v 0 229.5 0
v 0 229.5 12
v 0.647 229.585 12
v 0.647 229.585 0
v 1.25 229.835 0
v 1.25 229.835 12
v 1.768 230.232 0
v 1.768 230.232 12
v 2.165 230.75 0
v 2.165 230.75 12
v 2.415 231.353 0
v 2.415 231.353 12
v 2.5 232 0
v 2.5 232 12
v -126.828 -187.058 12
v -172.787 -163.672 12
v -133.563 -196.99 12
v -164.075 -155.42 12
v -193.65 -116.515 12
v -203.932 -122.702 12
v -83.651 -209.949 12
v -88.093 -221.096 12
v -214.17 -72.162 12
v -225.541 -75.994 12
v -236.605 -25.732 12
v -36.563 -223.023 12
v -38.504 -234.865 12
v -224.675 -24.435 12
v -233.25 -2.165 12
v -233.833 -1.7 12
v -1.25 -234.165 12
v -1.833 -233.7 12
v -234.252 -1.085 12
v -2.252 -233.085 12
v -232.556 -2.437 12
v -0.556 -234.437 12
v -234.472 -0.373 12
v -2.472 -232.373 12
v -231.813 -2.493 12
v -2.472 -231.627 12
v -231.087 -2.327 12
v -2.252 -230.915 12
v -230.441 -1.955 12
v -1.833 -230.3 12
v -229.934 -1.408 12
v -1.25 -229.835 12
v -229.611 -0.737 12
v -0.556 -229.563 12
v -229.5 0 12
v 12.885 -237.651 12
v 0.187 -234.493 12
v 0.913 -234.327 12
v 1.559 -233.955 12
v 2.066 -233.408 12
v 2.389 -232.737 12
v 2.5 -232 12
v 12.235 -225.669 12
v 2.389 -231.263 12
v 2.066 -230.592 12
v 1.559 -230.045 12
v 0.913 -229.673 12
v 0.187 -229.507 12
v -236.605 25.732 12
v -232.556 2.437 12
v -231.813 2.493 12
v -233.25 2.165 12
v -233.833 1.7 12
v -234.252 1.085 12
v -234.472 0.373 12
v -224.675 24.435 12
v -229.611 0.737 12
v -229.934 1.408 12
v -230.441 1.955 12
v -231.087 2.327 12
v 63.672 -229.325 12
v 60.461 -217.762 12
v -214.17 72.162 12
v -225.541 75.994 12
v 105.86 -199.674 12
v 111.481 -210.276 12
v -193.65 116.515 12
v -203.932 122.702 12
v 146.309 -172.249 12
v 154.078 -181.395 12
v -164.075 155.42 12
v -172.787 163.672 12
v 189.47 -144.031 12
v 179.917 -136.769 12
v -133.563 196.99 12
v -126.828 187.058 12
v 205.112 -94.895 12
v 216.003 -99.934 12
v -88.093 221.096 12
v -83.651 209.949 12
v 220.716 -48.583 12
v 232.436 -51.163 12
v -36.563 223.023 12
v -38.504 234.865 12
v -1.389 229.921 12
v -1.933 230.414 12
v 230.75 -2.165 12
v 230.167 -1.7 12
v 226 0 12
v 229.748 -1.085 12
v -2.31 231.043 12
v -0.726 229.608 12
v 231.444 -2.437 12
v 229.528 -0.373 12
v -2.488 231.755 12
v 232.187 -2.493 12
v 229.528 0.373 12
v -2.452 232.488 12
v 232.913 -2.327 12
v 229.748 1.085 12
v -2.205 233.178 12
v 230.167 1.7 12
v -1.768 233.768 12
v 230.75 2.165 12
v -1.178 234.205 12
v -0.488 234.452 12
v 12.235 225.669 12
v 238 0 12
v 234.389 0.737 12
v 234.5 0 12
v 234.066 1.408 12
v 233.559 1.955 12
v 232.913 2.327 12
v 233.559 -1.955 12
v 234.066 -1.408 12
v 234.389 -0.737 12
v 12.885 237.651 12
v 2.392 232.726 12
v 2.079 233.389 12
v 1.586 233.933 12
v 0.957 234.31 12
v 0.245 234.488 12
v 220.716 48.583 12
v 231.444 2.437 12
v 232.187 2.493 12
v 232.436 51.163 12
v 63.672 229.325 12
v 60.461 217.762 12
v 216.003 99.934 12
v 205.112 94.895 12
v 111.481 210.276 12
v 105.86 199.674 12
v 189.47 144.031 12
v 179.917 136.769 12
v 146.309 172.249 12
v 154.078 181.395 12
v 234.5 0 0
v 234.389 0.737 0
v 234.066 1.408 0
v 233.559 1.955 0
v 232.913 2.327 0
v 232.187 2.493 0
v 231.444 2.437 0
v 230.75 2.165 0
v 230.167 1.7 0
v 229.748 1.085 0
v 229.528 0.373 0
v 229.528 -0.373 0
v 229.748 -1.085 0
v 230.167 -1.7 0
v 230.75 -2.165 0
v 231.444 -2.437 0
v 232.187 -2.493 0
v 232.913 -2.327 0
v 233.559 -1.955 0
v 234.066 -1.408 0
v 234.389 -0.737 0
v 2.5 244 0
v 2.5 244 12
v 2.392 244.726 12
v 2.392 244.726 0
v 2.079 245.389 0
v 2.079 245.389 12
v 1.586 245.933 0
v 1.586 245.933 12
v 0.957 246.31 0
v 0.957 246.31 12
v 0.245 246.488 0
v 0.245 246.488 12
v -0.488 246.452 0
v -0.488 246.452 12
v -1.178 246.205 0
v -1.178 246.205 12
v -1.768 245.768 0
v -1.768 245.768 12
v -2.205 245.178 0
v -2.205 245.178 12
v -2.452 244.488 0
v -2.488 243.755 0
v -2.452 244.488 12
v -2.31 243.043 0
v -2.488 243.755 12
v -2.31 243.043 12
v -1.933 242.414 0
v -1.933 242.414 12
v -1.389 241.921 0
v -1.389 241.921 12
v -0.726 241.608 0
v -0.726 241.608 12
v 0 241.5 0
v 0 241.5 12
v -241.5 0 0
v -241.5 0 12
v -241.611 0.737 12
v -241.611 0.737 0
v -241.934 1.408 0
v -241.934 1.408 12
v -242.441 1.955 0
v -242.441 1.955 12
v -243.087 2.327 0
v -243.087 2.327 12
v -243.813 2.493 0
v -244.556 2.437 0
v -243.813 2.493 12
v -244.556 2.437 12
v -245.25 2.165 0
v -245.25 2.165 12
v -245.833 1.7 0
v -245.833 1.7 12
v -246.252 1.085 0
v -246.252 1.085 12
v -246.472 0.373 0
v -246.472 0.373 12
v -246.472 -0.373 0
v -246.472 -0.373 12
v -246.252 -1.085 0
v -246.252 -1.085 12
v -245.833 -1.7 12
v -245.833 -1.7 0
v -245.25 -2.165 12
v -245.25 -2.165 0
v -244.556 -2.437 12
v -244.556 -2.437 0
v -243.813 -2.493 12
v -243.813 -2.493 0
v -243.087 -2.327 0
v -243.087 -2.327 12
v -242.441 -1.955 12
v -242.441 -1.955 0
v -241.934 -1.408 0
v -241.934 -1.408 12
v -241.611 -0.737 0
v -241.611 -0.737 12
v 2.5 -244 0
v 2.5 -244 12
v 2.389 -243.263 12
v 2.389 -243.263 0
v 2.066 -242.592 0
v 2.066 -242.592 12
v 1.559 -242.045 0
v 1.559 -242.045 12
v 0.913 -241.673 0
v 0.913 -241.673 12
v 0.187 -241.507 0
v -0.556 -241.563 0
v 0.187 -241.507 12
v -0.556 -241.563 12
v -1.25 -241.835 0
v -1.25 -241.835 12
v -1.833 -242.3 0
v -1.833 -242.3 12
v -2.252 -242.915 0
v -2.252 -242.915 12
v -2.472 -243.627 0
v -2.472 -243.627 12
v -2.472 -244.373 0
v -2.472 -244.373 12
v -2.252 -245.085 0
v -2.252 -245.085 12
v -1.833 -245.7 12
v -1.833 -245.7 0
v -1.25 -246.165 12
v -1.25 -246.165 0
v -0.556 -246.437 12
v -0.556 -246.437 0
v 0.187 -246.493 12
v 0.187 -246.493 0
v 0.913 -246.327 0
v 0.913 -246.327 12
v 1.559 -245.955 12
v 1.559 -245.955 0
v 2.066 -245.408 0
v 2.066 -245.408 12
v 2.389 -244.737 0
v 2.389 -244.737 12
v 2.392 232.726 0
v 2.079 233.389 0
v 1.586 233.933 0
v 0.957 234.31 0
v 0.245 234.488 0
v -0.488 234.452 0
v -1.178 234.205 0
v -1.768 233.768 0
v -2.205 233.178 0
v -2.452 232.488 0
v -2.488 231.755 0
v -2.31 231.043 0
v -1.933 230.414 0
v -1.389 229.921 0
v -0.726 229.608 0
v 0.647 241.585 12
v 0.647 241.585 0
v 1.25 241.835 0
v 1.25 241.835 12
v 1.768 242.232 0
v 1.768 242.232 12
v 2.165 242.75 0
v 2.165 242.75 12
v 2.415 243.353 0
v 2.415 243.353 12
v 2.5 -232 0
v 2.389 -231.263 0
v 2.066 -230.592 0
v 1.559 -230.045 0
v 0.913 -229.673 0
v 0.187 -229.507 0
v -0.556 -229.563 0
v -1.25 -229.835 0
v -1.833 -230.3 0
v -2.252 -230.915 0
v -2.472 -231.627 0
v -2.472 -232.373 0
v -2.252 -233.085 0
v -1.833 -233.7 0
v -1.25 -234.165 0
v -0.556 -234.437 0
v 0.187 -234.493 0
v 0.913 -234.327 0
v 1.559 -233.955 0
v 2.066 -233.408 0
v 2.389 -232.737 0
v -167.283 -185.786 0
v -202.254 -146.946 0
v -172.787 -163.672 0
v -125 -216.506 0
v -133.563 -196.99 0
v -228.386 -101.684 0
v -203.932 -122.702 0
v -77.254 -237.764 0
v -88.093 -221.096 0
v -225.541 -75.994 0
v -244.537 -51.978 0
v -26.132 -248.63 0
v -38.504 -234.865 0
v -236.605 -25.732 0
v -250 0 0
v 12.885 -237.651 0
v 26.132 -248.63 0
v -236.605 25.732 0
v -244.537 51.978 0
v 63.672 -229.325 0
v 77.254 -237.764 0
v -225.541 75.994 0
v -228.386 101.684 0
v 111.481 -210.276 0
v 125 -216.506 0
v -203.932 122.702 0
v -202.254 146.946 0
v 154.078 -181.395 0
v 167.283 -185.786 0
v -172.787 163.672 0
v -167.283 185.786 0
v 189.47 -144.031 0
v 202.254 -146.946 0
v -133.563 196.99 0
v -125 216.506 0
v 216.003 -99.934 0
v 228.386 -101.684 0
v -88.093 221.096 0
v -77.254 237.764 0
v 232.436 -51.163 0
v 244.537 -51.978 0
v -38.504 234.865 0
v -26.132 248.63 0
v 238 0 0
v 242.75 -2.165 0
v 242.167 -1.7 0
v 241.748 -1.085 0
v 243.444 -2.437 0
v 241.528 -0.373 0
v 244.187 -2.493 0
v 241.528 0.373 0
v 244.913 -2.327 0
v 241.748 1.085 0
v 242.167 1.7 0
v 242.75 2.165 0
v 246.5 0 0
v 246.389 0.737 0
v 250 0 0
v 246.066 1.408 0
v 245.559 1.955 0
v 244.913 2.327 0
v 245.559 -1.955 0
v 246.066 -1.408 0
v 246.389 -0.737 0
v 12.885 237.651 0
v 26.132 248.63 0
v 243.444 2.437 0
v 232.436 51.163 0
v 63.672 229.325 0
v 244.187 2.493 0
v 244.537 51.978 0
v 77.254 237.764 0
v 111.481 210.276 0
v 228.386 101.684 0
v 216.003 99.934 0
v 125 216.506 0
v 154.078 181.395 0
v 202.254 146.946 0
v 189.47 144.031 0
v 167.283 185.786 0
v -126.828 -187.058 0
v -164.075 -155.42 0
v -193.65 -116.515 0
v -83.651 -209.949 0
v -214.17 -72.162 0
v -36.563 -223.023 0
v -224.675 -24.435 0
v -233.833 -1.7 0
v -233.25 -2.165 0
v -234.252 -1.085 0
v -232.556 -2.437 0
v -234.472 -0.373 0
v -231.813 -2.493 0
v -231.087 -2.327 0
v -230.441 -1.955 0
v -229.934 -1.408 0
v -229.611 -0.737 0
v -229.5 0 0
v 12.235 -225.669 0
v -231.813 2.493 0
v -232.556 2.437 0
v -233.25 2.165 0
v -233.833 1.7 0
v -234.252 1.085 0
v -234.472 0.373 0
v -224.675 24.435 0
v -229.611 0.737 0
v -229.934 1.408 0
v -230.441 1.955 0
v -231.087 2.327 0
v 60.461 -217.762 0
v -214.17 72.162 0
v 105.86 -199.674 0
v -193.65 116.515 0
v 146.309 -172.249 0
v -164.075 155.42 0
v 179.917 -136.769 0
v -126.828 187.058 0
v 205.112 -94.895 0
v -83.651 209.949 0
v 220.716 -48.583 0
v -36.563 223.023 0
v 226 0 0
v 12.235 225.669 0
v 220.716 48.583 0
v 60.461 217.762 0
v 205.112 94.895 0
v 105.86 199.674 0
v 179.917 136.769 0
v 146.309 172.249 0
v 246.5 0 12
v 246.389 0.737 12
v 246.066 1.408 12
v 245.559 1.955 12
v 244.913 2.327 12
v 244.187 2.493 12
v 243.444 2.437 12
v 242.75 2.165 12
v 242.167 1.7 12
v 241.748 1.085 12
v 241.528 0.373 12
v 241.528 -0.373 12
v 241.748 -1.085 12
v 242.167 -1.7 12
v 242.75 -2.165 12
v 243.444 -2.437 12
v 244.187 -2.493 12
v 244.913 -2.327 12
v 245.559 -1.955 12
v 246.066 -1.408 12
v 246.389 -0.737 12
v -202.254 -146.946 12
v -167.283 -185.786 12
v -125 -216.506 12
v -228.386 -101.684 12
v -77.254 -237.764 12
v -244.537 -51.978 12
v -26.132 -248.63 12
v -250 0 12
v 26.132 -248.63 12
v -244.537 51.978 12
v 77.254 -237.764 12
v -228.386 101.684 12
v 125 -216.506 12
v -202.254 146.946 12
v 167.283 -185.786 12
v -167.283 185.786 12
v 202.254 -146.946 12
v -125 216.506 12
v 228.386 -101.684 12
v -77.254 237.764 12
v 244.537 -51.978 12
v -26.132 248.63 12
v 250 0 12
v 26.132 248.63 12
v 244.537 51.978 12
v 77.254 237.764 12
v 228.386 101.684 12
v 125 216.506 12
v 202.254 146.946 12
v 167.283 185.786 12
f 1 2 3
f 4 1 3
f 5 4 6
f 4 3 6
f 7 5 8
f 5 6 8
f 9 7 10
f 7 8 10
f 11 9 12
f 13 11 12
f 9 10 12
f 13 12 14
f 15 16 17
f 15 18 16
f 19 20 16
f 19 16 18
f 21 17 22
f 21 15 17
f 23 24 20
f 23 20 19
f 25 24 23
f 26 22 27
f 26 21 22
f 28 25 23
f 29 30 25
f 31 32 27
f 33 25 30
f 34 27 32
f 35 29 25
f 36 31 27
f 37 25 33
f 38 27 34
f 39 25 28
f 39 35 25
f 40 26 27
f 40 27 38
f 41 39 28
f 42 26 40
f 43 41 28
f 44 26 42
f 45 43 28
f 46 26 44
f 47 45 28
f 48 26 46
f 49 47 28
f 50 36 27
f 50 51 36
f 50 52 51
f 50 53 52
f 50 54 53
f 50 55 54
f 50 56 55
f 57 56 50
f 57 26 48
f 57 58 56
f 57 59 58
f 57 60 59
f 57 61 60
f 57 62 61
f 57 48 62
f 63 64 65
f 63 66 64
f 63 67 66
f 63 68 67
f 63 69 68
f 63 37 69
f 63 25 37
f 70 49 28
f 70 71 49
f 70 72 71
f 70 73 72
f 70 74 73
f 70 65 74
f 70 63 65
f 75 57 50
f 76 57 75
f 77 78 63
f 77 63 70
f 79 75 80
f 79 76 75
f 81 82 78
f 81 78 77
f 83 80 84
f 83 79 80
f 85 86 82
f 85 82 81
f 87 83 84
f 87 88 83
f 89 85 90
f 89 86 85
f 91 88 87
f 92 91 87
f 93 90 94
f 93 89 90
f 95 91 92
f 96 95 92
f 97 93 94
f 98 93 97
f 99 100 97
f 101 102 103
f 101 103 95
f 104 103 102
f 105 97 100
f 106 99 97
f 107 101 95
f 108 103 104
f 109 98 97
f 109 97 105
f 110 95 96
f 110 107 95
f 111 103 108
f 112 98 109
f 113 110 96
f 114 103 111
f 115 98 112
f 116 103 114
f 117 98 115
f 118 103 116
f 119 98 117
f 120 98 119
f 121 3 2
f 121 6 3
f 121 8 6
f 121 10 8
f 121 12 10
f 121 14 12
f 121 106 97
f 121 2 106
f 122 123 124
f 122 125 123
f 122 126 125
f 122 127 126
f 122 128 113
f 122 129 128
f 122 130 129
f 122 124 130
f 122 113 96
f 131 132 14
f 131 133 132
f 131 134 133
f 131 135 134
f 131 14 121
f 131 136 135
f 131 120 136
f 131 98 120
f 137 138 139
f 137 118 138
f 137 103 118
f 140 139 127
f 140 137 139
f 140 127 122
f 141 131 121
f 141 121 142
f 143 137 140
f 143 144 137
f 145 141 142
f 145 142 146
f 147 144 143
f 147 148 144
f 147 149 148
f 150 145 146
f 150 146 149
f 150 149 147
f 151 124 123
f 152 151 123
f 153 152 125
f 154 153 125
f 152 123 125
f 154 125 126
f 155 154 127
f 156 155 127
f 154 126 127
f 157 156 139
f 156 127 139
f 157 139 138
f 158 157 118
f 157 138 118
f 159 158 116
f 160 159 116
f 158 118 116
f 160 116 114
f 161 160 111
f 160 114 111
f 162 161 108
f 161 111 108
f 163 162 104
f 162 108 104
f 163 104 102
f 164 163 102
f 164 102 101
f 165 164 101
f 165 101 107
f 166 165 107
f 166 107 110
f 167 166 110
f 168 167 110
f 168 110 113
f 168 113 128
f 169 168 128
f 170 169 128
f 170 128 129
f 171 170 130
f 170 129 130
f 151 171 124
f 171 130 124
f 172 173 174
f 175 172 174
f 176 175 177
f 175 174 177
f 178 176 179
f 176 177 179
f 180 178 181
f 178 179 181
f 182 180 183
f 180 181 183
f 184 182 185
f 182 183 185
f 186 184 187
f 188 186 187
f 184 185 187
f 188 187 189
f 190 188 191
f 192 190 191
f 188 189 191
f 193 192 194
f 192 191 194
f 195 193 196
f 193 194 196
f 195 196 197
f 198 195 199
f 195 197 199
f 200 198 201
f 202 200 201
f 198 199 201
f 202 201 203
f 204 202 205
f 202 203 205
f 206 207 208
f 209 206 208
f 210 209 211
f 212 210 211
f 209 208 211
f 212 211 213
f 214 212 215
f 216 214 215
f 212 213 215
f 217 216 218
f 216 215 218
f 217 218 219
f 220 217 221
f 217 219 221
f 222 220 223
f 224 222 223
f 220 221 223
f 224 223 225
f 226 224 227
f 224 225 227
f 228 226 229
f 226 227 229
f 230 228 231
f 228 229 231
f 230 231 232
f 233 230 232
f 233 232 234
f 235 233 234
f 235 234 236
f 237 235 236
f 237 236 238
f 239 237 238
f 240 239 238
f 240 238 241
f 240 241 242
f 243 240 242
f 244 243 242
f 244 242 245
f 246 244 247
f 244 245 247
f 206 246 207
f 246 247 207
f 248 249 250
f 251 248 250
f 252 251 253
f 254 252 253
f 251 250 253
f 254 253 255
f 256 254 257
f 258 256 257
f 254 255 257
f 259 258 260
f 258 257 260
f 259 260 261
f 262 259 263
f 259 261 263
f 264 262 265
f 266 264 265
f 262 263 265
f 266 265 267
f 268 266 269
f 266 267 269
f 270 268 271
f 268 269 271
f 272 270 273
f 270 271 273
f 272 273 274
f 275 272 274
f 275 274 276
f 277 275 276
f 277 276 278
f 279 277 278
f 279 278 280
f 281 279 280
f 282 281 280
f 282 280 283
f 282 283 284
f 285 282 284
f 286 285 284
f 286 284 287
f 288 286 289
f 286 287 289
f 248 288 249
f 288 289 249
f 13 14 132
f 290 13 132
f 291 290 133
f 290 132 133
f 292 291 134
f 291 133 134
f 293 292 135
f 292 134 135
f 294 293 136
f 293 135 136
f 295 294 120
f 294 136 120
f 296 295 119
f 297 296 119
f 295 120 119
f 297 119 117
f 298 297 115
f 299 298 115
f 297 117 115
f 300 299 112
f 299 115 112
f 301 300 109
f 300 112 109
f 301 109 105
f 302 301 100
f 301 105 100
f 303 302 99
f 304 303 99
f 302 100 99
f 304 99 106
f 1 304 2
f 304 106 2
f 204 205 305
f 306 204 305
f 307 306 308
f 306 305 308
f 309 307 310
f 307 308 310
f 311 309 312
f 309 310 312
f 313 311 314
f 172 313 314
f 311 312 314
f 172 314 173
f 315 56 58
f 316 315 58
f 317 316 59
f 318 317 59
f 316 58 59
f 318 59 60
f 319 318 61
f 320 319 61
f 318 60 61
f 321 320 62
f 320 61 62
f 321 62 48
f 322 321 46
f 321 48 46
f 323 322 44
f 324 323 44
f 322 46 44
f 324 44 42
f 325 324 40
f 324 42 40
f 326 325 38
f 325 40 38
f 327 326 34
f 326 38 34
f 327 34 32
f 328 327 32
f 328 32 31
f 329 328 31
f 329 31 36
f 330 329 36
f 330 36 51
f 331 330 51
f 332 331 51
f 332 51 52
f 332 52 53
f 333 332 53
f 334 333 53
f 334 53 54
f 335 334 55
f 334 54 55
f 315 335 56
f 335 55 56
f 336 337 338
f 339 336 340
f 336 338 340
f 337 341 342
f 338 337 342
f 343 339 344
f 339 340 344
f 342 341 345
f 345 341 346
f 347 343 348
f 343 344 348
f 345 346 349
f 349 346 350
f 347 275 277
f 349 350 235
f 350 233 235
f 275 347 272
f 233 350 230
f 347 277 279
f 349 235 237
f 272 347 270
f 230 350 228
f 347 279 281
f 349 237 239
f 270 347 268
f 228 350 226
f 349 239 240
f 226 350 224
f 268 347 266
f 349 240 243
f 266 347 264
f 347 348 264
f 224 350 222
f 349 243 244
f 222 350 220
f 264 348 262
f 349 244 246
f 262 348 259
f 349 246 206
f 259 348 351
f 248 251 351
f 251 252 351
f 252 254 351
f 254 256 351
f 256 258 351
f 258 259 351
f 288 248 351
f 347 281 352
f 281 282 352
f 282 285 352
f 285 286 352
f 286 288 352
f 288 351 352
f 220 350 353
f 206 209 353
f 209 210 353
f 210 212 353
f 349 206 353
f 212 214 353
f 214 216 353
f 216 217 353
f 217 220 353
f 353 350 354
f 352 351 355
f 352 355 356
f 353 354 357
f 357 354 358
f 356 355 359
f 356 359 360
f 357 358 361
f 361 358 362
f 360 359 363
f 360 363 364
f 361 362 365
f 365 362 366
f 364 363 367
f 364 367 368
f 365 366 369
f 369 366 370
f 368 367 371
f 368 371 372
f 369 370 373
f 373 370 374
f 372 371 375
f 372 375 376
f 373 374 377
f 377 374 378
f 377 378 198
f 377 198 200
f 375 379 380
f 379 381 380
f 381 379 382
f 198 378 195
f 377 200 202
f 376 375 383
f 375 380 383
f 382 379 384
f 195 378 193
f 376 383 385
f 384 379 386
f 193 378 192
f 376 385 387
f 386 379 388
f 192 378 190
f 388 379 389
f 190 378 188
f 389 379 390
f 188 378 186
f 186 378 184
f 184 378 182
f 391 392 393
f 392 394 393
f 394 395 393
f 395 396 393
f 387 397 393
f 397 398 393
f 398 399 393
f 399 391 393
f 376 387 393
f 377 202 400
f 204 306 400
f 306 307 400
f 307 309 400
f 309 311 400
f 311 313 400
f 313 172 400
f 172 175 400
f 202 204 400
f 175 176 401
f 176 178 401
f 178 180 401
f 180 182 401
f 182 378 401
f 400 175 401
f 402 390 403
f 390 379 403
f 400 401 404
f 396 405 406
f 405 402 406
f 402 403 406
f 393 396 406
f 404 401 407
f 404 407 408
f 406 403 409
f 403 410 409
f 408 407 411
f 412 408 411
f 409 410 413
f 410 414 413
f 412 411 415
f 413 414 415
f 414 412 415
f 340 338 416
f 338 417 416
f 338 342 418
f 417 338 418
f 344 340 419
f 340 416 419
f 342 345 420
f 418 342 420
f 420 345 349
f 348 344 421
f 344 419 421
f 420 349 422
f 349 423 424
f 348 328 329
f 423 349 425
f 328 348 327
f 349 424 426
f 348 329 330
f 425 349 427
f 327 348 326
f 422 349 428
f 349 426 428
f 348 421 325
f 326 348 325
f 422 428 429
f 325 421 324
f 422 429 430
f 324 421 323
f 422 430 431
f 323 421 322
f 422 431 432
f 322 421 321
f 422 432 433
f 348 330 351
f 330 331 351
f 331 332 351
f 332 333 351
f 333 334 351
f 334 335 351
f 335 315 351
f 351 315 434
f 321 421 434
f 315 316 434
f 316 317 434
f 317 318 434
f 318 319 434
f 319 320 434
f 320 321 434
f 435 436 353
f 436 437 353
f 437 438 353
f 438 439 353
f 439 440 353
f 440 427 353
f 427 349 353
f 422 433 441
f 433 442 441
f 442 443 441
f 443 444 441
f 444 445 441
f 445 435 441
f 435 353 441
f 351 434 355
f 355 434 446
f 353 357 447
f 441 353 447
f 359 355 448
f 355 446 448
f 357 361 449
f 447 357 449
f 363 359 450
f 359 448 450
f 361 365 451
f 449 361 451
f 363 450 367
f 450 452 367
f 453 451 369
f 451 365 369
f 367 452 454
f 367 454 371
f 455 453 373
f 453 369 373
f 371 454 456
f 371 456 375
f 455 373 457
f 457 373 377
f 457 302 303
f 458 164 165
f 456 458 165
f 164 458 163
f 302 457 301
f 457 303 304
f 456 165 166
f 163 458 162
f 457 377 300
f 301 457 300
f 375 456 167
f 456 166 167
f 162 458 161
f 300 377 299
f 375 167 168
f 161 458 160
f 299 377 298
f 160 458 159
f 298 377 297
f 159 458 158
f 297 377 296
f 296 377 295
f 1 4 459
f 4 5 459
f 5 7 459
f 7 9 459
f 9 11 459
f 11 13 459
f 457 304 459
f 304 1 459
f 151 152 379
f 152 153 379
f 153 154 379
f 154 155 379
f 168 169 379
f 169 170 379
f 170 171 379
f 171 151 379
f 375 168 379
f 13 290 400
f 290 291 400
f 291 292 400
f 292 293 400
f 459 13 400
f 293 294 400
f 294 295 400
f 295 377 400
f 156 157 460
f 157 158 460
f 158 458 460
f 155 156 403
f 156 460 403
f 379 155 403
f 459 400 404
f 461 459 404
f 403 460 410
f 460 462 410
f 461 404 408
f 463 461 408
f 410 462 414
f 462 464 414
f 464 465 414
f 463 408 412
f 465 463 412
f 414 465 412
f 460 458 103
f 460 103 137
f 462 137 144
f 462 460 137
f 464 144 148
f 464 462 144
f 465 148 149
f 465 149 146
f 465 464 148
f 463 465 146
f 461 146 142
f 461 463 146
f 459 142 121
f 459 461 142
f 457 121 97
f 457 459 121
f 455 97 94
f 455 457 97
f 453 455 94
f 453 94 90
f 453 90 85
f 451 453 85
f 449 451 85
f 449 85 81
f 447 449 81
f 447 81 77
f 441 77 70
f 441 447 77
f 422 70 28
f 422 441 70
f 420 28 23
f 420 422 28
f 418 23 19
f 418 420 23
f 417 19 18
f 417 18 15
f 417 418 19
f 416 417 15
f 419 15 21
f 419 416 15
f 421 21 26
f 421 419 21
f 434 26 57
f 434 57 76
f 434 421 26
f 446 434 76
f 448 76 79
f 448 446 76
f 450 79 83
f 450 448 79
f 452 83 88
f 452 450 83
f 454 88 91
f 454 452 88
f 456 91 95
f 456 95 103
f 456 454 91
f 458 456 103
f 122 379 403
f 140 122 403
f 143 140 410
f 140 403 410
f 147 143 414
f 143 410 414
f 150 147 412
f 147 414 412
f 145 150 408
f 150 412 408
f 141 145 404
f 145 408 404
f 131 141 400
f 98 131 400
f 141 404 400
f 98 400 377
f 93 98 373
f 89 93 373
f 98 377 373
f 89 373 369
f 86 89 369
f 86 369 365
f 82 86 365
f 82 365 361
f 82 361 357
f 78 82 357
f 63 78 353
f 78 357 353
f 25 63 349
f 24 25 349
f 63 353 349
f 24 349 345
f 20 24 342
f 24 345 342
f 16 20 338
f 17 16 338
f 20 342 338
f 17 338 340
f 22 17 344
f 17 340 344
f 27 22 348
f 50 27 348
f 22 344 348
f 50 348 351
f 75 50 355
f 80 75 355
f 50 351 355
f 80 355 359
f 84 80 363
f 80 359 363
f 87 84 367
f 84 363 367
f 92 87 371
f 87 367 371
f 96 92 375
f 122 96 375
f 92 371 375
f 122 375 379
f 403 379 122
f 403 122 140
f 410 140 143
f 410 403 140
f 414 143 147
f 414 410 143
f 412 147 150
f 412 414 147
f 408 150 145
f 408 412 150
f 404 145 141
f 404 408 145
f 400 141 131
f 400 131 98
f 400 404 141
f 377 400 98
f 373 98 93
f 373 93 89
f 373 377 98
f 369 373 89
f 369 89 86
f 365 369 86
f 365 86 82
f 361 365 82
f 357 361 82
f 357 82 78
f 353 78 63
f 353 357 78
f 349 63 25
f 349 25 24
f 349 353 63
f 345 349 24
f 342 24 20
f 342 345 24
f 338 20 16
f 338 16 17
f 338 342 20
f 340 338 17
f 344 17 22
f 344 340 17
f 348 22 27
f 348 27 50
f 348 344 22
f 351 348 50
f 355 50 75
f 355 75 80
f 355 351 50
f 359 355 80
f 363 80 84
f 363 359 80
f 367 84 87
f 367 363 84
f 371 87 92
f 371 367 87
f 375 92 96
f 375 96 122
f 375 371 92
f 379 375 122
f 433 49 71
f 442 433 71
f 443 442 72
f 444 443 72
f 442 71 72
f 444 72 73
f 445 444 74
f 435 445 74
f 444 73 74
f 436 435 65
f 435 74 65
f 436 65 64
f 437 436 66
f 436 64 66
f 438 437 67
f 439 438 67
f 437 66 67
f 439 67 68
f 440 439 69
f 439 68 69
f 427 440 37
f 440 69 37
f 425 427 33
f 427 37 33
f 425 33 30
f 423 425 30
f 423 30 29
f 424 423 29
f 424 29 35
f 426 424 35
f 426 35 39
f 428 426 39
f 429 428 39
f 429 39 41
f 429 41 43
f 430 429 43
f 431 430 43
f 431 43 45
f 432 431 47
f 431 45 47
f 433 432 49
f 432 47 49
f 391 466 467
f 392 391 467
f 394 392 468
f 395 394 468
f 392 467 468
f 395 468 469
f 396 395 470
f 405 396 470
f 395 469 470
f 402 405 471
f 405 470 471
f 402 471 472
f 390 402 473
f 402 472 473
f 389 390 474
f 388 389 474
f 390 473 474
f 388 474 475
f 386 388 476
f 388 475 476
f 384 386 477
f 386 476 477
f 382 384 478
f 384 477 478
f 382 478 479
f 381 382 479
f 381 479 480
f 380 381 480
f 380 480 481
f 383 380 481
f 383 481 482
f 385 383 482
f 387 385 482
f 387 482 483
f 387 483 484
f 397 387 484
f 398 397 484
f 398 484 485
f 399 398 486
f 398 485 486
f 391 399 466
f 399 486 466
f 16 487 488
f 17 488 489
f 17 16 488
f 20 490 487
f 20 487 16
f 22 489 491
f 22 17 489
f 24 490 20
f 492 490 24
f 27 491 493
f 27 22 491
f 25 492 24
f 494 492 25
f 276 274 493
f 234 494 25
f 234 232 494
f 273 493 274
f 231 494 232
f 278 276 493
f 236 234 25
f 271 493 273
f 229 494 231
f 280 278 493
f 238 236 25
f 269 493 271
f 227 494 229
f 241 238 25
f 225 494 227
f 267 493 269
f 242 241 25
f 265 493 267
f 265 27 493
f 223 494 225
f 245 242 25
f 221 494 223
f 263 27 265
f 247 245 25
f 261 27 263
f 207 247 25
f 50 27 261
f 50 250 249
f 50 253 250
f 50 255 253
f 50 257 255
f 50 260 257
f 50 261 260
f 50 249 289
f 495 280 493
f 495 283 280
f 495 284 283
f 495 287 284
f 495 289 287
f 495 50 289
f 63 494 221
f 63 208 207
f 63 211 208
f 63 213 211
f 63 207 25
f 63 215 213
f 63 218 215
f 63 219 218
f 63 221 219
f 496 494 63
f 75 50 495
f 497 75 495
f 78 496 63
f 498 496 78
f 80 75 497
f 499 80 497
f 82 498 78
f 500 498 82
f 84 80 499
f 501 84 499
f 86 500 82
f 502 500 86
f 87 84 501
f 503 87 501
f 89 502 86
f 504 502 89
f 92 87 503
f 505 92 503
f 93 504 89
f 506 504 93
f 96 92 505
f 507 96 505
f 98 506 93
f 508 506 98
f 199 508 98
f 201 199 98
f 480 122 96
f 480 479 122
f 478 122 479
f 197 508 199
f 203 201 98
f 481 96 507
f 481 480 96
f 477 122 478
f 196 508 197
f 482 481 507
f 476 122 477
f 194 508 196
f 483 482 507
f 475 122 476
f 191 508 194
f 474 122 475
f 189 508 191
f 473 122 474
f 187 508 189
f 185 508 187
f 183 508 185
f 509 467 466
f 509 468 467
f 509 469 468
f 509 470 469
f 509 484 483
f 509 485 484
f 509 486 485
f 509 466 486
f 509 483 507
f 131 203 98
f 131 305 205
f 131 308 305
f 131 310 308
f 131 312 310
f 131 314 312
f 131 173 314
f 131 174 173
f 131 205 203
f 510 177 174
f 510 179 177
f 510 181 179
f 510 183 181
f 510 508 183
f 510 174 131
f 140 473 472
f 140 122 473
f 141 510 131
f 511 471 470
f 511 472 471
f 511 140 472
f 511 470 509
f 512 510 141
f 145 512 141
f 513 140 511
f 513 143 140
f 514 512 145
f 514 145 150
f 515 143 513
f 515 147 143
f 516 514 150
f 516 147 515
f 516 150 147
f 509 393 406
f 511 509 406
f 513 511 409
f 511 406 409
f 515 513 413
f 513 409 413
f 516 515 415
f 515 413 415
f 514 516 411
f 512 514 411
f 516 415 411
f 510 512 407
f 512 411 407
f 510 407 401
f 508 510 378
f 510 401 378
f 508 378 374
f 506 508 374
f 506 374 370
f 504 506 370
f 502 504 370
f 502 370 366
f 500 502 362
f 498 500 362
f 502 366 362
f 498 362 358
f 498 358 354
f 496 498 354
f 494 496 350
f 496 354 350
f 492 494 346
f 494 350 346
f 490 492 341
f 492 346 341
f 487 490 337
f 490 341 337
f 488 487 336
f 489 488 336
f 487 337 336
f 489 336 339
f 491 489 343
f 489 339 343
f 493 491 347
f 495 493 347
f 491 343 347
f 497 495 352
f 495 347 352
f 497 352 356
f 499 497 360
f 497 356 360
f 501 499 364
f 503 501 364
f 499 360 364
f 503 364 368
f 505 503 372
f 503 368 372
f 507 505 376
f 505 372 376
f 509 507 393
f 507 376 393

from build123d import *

# Parameters (mm, degrees)
F0_R     = 250
F0_R_2   = 238
F1_DEPTH = 12
F2_R     = 238
F2_R_2   = 226
F3_DEPTH = 12
F4_R     = 2.5
F5_DEPTH = 12
F6_R     = 2.5
F7_DEPTH = 12


with BuildPart() as f1:
    # F0 (on Top) → F1 (new body)
    with BuildSketch(Plane.XY):
        Circle(F0_R)
        Circle(F0_R_2, mode=Mode.SUBTRACT)
    extrude(amount=F1_DEPTH)

    # F6 (on face) → F7 (cut)
    with BuildSketch(Plane.XY.offset(12)):
        with BuildLine():
            ThreePointArc((0, 241.5), (1.767767, 242.232233), (2.5, 244))
            ThreePointArc((2.5, 244), (-1.767767, 245.767767), (0, 241.5))
        make_face()
        with Locations((-244, 0)):
            Circle(F6_R)
        with Locations((0, -244)):
            Circle(F6_R)
        with Locations((244, 0)):
            Circle(F6_R)
    extrude(amount=-F7_DEPTH, mode=Mode.SUBTRACT)


with BuildPart() as f3:
    # F2 (on Top) → F3 (new body)
    with BuildSketch(Plane.XY):
        Circle(F2_R)
        Circle(F2_R_2, mode=Mode.SUBTRACT)
    extrude(amount=F3_DEPTH)

    # F4 (on face) → F5 (cut)
    with BuildSketch(Plane.XY.offset(12)):
        with BuildLine():
            ThreePointArc((0, 229.5), (1.767767, 230.232233), (2.5, 232))
            ThreePointArc((2.5, 232), (-1.767767, 233.767767), (0, 229.5))
        make_face()
        with Locations((-232, 0)):
            Circle(F4_R)
        with Locations((0, -232)):
            Circle(F4_R)
        with Locations((232, 0)):
            Circle(F4_R)
    extrude(amount=-F5_DEPTH, mode=Mode.SUBTRACT)


solid = Compound([f1.part, f3.part])
